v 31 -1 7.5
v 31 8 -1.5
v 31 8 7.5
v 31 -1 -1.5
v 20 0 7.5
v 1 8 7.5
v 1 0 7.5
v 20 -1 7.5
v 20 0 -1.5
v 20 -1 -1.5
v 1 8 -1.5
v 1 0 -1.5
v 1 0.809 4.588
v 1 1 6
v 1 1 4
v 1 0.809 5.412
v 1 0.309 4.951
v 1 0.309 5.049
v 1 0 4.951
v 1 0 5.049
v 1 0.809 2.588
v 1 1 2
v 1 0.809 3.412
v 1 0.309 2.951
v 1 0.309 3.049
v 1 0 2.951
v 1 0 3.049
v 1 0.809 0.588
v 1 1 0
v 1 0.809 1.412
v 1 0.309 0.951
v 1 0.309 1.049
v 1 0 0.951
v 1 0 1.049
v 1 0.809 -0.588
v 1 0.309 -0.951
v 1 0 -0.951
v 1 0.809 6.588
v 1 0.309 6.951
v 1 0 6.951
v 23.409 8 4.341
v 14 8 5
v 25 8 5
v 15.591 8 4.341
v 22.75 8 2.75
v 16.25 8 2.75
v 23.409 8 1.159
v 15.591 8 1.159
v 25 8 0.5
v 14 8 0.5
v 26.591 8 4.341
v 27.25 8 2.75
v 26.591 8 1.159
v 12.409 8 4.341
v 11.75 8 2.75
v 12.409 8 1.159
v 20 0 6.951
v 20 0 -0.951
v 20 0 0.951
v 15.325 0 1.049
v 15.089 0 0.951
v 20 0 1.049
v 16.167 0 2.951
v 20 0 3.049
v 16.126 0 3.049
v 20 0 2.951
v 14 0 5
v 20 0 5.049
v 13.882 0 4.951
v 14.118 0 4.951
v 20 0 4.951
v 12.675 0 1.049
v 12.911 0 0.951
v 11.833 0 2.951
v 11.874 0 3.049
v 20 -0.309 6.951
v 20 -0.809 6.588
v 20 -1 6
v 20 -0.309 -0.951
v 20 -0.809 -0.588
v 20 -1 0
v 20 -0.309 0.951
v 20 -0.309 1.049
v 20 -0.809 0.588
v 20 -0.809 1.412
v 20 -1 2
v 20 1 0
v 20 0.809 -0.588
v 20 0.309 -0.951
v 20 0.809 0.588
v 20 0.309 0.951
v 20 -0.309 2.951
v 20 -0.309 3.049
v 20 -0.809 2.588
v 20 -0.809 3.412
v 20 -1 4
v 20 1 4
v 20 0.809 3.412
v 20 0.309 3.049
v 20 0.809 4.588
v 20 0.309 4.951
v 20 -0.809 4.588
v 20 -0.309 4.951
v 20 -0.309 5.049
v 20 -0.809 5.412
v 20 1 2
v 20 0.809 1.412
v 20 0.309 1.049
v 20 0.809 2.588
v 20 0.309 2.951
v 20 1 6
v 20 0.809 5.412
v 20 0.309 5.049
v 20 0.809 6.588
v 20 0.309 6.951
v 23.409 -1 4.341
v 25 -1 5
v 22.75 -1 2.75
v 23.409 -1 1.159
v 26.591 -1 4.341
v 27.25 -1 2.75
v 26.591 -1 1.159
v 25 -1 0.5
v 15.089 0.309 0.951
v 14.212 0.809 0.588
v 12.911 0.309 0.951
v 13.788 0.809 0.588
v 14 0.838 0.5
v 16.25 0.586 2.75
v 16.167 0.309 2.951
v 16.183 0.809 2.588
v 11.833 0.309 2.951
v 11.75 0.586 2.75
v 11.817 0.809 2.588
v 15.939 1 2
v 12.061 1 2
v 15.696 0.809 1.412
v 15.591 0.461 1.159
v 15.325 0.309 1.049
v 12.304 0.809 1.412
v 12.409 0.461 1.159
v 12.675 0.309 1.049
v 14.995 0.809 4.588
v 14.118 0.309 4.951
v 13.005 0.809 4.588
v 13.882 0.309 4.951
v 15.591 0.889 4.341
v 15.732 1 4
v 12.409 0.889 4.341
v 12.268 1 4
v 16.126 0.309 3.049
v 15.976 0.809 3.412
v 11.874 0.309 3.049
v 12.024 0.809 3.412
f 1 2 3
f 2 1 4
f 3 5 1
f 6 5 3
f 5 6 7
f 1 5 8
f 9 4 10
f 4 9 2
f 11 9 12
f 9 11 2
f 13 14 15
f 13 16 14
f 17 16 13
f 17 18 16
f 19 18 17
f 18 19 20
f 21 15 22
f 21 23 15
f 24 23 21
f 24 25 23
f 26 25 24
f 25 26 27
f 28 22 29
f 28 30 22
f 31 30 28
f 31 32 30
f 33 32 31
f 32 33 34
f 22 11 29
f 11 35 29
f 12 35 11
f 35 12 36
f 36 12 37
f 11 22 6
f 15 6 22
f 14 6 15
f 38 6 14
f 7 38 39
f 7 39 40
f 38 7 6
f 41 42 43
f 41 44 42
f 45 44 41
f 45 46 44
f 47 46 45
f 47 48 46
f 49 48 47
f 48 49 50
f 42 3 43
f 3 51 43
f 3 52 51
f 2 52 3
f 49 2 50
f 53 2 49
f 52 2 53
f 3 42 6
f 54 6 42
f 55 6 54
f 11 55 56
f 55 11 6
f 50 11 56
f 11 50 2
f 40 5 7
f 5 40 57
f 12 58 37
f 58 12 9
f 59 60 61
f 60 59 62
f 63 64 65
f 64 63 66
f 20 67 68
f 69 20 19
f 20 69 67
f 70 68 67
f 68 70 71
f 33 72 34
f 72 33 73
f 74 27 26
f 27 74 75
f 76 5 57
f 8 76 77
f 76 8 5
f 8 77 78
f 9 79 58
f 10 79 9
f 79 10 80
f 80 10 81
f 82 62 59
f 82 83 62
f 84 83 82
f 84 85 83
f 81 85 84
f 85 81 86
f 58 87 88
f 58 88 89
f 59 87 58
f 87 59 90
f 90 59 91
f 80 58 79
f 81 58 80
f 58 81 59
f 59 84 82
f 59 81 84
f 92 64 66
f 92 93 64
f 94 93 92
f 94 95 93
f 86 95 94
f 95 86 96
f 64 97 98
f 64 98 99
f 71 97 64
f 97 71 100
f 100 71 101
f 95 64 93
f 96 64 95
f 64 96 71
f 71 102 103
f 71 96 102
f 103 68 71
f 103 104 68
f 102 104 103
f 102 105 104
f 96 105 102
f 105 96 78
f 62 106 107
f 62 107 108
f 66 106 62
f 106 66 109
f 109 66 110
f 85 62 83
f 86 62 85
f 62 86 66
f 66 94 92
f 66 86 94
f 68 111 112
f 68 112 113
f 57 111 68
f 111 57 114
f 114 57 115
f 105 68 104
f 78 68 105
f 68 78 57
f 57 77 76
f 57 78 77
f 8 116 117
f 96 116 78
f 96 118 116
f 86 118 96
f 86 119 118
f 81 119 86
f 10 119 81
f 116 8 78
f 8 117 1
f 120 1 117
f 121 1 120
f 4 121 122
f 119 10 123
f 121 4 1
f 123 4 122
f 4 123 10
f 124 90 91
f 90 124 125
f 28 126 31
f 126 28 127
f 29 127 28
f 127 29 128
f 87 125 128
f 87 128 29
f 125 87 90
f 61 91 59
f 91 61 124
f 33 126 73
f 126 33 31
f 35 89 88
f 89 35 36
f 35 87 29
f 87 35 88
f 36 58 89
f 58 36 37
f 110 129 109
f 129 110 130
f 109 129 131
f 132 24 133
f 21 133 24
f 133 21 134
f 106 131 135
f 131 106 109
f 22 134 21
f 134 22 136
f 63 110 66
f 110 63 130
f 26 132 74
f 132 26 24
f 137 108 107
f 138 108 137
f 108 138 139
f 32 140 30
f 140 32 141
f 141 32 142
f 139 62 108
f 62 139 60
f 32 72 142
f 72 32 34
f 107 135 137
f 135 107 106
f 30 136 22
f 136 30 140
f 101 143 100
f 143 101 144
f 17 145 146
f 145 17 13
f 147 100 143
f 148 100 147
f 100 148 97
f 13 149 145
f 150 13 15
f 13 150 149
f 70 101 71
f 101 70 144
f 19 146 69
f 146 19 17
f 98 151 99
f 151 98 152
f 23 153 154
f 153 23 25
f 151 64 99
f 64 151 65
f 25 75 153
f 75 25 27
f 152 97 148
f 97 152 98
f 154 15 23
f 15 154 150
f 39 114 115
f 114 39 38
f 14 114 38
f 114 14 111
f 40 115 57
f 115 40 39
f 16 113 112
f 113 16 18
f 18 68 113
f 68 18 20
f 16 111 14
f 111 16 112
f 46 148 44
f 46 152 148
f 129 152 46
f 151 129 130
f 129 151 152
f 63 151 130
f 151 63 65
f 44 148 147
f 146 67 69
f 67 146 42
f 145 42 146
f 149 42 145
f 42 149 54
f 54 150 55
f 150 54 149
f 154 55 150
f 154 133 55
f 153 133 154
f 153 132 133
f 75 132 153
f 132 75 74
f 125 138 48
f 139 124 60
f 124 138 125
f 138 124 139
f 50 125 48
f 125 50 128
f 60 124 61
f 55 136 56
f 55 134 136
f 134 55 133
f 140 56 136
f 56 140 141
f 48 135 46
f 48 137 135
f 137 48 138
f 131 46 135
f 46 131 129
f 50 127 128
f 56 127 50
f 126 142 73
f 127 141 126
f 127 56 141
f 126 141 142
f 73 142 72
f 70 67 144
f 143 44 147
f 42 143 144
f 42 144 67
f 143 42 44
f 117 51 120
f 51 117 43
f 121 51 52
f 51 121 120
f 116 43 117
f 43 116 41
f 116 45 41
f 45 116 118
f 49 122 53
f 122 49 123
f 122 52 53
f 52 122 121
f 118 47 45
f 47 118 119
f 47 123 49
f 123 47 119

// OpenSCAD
module strings() {
  rotate([90,0,90]) {
  translate([0,0,0]) cylinder(r1 = 1,r2 = 1, h=20, $fn=10);
  translate([0,2,0]) cylinder(r1 = 1,r2 = 1, h=20, $fn=10);
  translate([0,4,0]) cylinder(r1 = 1,r2 = 1, h=20, $fn=10);
  translate([0,6,0]) cylinder(r1 = 1,r2 = 1, h=20, $fn=10);
  }
}


module bloque(){
	translate([1,0,-1.5])cube([30,8,9]);
	translate([20,-1,-1.5])cube([11,8,9]);
}

module holes() {
	translate([14,9,5-4.5/2])rotate([90,0,0])cylinder(r1=4.5/2,r2=4.5/2, h=11);
	translate([25,9,5-4.5/2])rotate([90,0,0])cylinder(r1=4.5/2,r2=4.5/2, h=11);
}

difference() {
	difference() {
		
		bloque();
		strings();
	}
	holes();
}
